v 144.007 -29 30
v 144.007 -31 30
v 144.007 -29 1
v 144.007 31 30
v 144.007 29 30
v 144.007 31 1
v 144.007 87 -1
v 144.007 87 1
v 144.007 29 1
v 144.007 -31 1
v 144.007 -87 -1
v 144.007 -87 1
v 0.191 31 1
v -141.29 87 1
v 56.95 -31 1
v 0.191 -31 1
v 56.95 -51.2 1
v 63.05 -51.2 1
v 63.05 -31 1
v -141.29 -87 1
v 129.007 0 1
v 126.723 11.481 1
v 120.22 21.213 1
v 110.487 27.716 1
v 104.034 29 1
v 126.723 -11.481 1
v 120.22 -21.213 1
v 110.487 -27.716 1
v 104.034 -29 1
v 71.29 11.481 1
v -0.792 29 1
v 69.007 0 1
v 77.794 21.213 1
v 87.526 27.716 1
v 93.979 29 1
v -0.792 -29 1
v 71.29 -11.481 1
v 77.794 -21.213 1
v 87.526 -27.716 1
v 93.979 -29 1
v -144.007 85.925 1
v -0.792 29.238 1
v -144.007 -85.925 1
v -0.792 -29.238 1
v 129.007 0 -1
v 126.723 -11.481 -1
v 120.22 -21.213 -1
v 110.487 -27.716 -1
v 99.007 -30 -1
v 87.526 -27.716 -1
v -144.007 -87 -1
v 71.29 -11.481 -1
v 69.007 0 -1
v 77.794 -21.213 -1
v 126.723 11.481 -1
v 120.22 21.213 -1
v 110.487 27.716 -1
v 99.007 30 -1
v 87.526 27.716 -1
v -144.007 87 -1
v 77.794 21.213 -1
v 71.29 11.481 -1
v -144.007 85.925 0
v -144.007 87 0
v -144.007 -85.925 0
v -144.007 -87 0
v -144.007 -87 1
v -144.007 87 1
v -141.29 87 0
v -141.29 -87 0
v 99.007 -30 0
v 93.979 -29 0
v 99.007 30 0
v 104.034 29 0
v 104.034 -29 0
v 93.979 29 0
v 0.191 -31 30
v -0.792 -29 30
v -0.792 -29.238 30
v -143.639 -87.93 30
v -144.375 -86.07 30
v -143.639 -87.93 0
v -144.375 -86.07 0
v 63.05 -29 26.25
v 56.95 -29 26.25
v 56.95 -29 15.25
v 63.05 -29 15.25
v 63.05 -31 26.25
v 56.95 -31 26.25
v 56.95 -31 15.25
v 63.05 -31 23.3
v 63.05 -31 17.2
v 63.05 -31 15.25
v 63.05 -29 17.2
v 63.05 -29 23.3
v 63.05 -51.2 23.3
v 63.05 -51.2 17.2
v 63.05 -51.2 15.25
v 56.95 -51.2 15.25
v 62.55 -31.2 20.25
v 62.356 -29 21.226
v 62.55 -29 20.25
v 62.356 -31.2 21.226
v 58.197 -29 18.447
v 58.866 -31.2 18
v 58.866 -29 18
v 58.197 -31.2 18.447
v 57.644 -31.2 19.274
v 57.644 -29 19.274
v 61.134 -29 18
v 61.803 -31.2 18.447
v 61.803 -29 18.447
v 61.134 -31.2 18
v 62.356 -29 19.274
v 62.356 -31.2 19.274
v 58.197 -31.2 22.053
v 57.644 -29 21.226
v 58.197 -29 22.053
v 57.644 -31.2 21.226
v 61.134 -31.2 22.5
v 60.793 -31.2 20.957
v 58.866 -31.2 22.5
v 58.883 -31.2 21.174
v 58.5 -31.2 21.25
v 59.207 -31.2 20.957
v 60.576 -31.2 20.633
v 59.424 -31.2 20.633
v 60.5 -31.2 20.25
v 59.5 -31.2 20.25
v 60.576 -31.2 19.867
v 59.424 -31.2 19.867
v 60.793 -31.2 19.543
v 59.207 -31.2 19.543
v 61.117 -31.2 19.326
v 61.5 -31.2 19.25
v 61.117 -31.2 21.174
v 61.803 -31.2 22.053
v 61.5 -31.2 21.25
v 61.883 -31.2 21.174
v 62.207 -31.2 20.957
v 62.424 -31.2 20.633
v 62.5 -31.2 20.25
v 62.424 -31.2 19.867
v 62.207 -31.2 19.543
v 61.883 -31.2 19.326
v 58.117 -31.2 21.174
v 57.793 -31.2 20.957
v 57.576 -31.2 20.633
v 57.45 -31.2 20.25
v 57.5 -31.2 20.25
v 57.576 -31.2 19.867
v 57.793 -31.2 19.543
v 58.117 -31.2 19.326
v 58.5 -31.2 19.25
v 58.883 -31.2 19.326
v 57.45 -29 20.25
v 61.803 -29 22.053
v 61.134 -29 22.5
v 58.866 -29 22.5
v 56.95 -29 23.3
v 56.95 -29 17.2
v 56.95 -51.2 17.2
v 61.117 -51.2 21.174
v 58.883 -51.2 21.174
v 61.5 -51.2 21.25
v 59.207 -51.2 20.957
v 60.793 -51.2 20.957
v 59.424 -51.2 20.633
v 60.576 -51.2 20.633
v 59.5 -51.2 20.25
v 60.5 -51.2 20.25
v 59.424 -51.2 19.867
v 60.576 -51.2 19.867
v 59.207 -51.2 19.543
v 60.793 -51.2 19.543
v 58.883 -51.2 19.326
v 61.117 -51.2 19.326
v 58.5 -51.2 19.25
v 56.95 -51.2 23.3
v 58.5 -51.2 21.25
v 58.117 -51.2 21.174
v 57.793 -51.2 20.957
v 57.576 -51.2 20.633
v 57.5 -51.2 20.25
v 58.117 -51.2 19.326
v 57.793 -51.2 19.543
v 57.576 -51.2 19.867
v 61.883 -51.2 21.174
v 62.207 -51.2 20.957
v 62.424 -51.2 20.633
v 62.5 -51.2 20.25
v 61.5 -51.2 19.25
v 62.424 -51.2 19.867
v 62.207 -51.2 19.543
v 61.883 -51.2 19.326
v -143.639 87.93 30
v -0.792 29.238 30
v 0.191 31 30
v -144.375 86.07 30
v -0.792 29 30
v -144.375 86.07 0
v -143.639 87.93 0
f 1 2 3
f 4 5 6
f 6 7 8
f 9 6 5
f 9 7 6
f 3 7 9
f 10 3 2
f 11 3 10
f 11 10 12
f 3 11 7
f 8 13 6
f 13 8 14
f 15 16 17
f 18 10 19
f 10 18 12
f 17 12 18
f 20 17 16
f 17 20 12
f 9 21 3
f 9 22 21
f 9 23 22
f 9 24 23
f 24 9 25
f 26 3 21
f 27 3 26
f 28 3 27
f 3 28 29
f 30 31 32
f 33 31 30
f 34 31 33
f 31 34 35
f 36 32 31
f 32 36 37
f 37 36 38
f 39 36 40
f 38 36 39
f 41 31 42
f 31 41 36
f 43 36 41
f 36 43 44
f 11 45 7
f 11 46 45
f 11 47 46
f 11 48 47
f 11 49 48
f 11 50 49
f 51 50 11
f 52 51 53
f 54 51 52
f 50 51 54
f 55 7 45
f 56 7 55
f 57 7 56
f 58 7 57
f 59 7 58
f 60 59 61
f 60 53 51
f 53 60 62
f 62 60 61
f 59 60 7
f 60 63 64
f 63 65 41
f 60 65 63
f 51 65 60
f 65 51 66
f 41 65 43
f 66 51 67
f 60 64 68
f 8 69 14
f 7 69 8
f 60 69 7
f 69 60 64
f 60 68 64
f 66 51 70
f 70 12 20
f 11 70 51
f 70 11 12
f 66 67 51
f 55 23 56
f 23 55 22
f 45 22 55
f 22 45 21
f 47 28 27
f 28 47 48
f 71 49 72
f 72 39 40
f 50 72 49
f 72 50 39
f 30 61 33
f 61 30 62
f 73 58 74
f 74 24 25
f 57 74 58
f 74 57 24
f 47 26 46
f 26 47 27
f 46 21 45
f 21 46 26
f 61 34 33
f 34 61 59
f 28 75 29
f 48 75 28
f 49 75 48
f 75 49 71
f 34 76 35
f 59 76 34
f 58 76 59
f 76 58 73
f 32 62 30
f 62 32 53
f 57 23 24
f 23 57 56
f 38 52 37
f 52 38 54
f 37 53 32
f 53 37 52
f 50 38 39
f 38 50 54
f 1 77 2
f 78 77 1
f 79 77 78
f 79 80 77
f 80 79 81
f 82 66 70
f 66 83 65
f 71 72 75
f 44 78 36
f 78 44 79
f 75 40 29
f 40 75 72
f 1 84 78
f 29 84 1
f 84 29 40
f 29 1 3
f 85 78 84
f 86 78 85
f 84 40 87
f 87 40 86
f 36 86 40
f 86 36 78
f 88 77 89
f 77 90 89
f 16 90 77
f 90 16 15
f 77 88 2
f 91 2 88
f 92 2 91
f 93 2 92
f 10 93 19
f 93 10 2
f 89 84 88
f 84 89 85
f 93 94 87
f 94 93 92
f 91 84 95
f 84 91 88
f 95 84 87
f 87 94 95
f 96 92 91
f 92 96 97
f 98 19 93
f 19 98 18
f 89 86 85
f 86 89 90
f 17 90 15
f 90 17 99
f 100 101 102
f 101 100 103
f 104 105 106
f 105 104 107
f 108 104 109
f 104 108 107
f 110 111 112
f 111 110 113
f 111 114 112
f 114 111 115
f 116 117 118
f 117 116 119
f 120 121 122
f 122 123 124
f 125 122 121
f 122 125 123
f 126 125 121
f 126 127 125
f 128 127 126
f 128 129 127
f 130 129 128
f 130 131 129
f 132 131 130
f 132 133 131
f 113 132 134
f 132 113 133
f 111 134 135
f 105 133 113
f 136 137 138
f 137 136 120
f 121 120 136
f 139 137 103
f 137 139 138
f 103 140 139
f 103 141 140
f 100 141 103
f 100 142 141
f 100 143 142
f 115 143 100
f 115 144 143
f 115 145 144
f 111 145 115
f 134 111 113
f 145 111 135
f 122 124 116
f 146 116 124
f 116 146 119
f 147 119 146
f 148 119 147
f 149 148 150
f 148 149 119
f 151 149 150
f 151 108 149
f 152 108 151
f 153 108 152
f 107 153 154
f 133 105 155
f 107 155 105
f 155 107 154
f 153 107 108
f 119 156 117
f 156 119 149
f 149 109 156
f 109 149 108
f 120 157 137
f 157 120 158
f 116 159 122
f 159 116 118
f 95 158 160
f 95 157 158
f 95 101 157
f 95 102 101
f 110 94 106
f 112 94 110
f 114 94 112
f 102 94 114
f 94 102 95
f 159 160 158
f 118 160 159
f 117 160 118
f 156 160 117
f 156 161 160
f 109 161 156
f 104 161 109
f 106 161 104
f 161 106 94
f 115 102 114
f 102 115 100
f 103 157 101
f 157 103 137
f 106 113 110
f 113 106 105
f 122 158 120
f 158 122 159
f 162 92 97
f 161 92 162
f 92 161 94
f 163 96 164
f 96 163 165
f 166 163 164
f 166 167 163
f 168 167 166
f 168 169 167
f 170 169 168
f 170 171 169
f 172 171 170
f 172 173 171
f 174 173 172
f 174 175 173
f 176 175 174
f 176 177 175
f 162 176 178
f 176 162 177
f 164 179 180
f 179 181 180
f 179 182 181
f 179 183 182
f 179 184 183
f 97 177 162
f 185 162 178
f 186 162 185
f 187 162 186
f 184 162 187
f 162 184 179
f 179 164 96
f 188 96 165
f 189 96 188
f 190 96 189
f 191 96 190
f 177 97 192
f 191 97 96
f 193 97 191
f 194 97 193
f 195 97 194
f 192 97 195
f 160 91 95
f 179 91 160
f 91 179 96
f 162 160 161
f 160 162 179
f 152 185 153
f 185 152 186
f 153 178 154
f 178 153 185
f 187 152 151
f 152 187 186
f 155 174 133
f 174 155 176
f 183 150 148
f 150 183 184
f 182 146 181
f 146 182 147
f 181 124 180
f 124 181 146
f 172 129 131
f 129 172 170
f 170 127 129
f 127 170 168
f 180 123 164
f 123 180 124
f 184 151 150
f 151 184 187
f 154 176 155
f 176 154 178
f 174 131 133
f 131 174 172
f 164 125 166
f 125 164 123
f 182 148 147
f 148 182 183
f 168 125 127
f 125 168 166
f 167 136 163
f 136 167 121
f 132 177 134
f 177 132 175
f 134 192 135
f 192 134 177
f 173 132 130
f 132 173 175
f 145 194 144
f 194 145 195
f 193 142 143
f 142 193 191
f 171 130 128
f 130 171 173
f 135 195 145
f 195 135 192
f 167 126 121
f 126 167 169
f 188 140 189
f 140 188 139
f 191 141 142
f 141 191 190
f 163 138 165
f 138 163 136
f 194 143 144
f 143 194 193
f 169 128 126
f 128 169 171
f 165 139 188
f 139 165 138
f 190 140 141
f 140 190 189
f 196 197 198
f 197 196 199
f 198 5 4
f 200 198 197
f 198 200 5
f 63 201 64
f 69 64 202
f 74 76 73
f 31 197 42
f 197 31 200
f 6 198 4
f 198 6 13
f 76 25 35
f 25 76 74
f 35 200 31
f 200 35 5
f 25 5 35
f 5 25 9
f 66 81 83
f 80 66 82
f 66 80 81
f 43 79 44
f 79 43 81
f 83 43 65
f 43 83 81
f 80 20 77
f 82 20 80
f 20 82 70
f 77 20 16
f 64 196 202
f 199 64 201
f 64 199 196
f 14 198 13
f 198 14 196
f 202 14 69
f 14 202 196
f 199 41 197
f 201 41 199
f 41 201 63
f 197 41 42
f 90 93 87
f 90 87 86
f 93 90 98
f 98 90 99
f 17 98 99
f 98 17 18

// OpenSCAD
// file: photoresistorCasing.scad
module photoresistorCasing(){
  fn=16;
  baseCubeHeight=22.2;
  photoresistorDiameter=5.1;
  photoresistorHeight=2.2;
  difference(){
    //Basiscubus
    translate([0, 0, 0])cube([photoresistorDiameter+1, photoresistorDiameter+1, baseCubeHeight], center = true);
    
    //Ausschnitt Photoresitor
    translate([0, 0, (baseCubeHeight-photoresistorHeight)/2])difference(){
      cylinder($fn = fn, d=photoresistorDiameter, h=photoresistorHeight, center=true);
      translate([+3/2 + 4.5/2, 0, 0])cube([3, 3, 3], center = true);
      translate([-3/2 - 4.5/2, 0, 0])cube([3, 3, 3], center = true);
    }
    
    //Löcher Beine Lichtsensor. Höhe extra übertrieben, ging nicht anders.
    translate([0,  (4-1)/2, -(baseCubeHeight-20)/2])cylinder($fn = fn, d=2, h=22, center=true);
    translate([0, -(4-1)/2, -(baseCubeHeight-20)/2])cylinder($fn = fn, d=2, h=22, center=true);
  }
}

photoresistorCasing();
// main file
heightBox=180;
widthBox=180;
lengthBox=280;
thicknessWall=3;
fn=16;
angleToX=atan(85/(lengthBox-2*thicknessWall));
additionalSlopeHeight=2*cos(angleToX);
additionalSlopeLength=2*sin(angleToX);
lengthSlope=sqrt(pow(lengthBox-(2*thicknessWall)+(2*additionalSlopeLength), 2)+pow(85, 2));
widthSlope=widthBox-2*thicknessWall;
heightBetweenGroundAndSlopeMiddle=heightBox-2*thicknessWall-additionalSlopeHeight/2-85;
wallLength=sqrt(pow(lengthSlope/2, 2)+pow(widthSlope/2 - 30, 2));
wallAngle=atan((widthSlope/2 - 30)/(lengthSlope/2));
wallAdditionalLength=2*tan(wallAngle);
photoSensorHeightTranslation=20.25;

include <photoresistorCasing.scad>

difference(){
  translate([0, 0, heightBetweenGroundAndSlopeMiddle/2 - additionalSlopeHeight/2])union(){
    
    //Querfläche + Seiten
    rotate([0, angleToX, 0])!union(){
      difference(){
        cube([lengthSlope, widthSlope, 2], center=true);
        translate([(lengthSlope-60-30)/2, 0, 0])cylinder($fn=fn, d=60, h=2, center=true);
      }
      translate([(lengthSlope/2 - wallAdditionalLength)/2, 30, 30/2])cube([lengthSlope/2 + wallAdditionalLength, 2, 30], center=true);
      difference(){
          translate([(lengthSlope/2 - wallAdditionalLength)/2, -30, 30/2])cube([lengthSlope/2 + wallAdditionalLength, 2, 30], center=true);
          translate([60, -30-22.2/2+1, photoSensorHeightTranslation])rotate([0, 90, 90])
          //Basiscubus
          translate([0, 0, 0])cube([4.5*2 + 3, 5.1+1, 22.2], center = true);
      }
      translate([-lengthSlope/4, -30/2 - widthSlope/4, 30/2])rotate([0, 0, wallAngle])cube([wallLength, 2, 30], center=true);
      translate([-lengthSlope/4, 30/2 + widthSlope/4, 30/2])rotate([0, 0, -wallAngle])cube([wallLength, 2, 30], center=true);
      
      // Gehäuse Photowiderstand
      translate([60, -30-22.2/2+1, photoSensorHeightTranslation])rotate([0, 90, 90])photoresistorCasing();
      
      //Stützcubus
      translate([60, -30-22.2/2+1, photoSensorHeightTranslation/2 - 2])cube([5.1+1, 22.2, photoSensorHeightTranslation - 6], center = true);
    }
    
    //Abstandhalter zu Boden
    translate([(lengthBox-(2*thicknessWall))/2 - 1, 0, -(heightBetweenGroundAndSlopeMiddle/2 + 85/2)])cube([2, widthBox, heightBetweenGroundAndSlopeMiddle], center=true);
  }



//Box

  difference(){
    cube([lengthBox + 300, widthBox + 300, heightBox + 300], center=true);
    cube([lengthBox-2*thicknessWall, widthBox-2*thicknessWall, heightBox-2*thicknessWall], center=true);
  }
}
